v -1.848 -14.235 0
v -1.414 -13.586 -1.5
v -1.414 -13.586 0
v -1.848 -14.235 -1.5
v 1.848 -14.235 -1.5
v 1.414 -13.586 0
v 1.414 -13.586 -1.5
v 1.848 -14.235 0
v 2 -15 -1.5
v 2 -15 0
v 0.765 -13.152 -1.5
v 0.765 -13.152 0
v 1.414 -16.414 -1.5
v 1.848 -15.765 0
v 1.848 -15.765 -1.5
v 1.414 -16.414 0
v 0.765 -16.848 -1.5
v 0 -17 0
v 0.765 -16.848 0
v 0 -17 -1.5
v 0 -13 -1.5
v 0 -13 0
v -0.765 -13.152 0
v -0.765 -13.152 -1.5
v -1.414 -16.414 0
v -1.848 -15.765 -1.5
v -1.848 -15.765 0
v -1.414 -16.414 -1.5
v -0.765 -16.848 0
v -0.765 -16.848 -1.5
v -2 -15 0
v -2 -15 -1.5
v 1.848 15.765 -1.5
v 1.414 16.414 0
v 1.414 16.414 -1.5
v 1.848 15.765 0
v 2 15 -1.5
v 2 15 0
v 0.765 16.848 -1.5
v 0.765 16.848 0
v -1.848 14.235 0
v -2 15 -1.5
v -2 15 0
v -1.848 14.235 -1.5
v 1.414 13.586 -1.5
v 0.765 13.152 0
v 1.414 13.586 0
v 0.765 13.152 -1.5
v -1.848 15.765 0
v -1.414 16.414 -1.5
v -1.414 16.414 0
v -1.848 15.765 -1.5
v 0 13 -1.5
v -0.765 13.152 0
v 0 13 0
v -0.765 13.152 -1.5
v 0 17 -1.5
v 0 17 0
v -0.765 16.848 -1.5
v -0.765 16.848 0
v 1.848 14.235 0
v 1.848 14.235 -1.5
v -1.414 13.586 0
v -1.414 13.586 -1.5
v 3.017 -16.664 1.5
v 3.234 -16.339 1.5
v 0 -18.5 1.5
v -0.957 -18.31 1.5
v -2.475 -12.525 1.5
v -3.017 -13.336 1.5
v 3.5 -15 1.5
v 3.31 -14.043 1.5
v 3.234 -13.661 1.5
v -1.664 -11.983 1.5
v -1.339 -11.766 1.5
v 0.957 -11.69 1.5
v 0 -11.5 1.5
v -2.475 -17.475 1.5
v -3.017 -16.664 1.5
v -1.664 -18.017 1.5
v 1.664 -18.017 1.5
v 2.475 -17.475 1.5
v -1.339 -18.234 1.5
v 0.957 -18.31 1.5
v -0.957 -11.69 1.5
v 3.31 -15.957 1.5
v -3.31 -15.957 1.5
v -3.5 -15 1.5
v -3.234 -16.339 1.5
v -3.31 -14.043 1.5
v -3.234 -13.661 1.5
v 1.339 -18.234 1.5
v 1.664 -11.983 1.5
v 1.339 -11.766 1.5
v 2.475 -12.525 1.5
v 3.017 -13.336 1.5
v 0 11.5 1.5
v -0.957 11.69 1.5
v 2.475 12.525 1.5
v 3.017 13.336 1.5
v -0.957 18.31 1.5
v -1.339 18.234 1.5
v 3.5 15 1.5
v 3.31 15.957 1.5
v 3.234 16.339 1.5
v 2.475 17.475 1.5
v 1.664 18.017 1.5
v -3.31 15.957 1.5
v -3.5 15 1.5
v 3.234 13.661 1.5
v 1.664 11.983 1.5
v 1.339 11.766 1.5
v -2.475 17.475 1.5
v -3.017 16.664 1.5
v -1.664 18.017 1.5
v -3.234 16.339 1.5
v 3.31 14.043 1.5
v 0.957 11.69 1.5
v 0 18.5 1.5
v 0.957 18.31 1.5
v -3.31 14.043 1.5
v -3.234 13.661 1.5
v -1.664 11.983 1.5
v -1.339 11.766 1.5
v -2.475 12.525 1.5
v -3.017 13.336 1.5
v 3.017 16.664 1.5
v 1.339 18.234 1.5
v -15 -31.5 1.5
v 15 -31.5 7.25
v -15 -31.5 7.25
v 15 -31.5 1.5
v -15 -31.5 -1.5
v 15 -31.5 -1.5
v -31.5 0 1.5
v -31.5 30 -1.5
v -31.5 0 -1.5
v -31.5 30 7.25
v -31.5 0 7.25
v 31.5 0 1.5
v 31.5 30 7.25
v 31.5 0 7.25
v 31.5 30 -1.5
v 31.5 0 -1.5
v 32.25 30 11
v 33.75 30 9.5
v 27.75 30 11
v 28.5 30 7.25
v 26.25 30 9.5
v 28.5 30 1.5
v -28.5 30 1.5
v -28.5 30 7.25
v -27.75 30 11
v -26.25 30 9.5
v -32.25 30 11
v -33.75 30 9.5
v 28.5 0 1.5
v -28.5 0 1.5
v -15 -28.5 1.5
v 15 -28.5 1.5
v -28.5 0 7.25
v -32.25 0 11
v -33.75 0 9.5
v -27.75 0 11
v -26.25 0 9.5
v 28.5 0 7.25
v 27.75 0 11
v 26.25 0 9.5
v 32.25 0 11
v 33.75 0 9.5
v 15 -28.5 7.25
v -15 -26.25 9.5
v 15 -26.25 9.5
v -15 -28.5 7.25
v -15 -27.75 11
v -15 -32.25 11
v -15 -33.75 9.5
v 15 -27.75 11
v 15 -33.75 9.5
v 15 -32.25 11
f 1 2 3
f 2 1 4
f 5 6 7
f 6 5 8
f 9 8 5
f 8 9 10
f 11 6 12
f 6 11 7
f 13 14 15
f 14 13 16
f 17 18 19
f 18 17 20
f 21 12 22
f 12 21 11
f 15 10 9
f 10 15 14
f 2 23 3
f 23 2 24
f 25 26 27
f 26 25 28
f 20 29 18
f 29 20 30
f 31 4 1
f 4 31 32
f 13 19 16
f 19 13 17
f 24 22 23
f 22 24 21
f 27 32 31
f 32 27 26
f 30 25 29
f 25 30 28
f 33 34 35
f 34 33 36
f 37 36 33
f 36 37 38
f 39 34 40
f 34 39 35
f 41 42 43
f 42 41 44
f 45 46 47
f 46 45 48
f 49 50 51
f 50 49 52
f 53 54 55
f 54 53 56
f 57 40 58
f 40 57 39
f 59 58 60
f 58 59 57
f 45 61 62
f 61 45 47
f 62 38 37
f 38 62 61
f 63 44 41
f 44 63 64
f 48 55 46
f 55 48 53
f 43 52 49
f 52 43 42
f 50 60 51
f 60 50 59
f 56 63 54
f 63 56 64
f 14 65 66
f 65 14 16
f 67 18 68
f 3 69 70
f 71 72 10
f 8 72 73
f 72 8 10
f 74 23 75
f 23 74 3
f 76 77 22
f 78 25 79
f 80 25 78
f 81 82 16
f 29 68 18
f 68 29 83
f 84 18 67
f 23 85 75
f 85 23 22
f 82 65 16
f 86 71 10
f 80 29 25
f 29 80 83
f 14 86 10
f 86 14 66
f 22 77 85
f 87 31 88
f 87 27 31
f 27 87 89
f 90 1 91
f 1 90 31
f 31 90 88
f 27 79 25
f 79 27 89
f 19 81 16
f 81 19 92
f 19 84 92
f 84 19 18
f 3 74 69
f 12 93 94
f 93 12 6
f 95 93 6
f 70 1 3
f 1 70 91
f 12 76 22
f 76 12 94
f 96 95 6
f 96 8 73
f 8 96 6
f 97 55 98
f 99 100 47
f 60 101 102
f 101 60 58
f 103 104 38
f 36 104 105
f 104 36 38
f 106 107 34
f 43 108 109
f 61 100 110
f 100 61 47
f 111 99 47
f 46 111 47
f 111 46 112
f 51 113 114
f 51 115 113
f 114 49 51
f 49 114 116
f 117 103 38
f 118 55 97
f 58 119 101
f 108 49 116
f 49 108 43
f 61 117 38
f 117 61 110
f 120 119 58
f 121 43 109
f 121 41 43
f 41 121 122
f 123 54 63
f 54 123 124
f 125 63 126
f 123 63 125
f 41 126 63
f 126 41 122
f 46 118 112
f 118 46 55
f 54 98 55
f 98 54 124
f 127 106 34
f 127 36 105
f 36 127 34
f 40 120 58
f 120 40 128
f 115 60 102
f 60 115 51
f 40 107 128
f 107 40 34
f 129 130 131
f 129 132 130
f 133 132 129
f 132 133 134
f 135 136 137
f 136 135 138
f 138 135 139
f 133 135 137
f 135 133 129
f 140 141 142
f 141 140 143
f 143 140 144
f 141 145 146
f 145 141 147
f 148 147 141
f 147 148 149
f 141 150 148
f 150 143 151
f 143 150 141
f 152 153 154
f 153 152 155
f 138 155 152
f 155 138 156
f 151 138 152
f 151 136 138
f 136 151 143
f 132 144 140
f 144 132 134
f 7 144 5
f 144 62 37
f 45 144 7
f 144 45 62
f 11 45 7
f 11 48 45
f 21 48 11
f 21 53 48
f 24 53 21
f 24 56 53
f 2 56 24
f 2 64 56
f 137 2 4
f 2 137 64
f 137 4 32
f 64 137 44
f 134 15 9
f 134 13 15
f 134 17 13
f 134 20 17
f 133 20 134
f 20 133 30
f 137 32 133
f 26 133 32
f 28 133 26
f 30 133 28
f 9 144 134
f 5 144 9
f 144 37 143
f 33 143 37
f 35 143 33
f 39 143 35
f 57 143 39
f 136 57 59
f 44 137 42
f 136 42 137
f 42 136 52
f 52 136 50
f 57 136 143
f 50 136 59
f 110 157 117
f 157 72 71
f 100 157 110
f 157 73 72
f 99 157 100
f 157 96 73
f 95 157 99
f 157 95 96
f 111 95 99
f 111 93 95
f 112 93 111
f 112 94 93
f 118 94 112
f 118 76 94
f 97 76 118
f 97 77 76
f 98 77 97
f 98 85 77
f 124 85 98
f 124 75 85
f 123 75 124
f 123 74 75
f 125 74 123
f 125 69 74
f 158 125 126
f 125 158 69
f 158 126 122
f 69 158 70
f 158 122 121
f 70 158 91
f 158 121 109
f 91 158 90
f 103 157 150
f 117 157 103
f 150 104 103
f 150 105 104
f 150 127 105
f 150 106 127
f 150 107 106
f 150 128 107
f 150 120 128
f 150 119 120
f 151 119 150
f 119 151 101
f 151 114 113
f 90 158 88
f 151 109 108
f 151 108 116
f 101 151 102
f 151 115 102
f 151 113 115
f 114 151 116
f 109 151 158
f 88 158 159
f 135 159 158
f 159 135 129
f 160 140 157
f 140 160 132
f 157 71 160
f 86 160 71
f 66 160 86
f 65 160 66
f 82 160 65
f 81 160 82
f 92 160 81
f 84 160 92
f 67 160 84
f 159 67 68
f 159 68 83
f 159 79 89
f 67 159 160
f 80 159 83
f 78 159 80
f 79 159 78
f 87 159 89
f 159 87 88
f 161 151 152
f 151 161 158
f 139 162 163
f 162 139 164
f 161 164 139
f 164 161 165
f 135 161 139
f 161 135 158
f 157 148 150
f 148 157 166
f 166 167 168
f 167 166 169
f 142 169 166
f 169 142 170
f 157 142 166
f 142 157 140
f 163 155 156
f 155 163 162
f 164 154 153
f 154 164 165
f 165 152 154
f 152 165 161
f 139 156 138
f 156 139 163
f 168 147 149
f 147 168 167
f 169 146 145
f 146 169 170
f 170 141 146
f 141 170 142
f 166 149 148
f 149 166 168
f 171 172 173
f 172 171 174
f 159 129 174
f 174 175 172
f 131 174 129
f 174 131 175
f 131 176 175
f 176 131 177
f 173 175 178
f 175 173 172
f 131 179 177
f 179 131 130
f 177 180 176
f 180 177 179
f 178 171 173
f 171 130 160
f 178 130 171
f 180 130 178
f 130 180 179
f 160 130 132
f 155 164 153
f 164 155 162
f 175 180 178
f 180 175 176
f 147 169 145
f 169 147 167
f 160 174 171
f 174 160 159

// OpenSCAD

l = 60;
b = 60;
h = 8;
t = 3;
s = 4;

difference()
{
hull()
{
for ( a = [ -1, +1 ] )
	tx( l/2*a ) ty( b/4 )
		cbox( t, b/2, t );

	ty( -b/2 )
		cbox( l/2, t, t );
}

for ( a = [ -1, +1 ] )
	ty( a * l/4 )
		ccyl( d = s, h = 100, $fn = 16 );

for ( a = [ -1, +1 ] )
	ty( a * l/4 ) tz( t/2 )
		ccyl( d1 = s, d2 = s+t*2, h = t, $fn = 16 );
}


for ( a = [ -1, +1 ] )
	tx( l/2*a ) tz( h / 2 ) ty( b/4 )
		cbox( t, b/2, t+h );

	ty( -b/2 ) tz( h / 2 )
		cbox( l/2, t, t+h );

	

intersection()
{
union()
{
for ( a = [ -1, +1 ] )
	tx( l/2*a ) tz( h + t / 2 ) ty( b/4 )
		rx( 90 )
			ccyl( d = t*2.5, h = b/2, $fn = 4 );

	ty( -b/2 ) tz( h + t / 2 )
		ry( 90 )
			ccyl( d = t*2.5, h = l/2, $fn = 4 );
}

cbox( l*2, b*2, h*2 + t*2 );
}


/// lazy.scad 1.1
/// a collection of useful macros for the lazy OpenSCAD programmer
/// http://www.thingiverse.com/thing:512443

// single axis translations
module tx( x ) translate( [ x, 0, 0 ] ) for(c=[0:$children-1])child(c);
module ty( y ) translate( [ 0, y, 0 ] ) for(c=[0:$children-1])child(c);
module tz( z ) translate( [ 0, 0, z ] ) for(c=[0:$children-1])child(c);

// 2d translations
module txy( x, y ) translate( [ x, y, 0 ] ) for(c=[0:$children-1])child(c);
module tyz( y, z ) translate( [ 0, y, z ] ) for(c=[0:$children-1])child(c);
module txz( x, z ) translate( [ x, 0, z ] ) for(c=[0:$children-1])child(c);

// 3d translation
module txyz( x, y, z ) translate( [ x, y, z ] ) for(c=[0:$children-1])child(c);

// single axis rotations
module rx( a ) rotate( [ a, 0, 0 ] ) for(c=[0:$children-1])child(c);
module ry( a ) rotate( [ 0, a, 0 ] ) for(c=[0:$children-1])child(c);
module rz( a ) rotate( [ 0, 0, a ] ) for(c=[0:$children-1])child(c);

// centered box (cube)
module cbox( x, y, z ) cube( [ x, y, z ], center = true );

// centered cylinder
module ccyl( d, h, d1, d2, r, r1, r2 )
 cylinder( h = h, r = ( d == undef ? r : d/2 ), r1 = ( d1 == undef ? r1 : d1/2 ), r2 = ( d2 == undef ? r2 : d2 / 2 ), center = true );

/// end lazy.scad
